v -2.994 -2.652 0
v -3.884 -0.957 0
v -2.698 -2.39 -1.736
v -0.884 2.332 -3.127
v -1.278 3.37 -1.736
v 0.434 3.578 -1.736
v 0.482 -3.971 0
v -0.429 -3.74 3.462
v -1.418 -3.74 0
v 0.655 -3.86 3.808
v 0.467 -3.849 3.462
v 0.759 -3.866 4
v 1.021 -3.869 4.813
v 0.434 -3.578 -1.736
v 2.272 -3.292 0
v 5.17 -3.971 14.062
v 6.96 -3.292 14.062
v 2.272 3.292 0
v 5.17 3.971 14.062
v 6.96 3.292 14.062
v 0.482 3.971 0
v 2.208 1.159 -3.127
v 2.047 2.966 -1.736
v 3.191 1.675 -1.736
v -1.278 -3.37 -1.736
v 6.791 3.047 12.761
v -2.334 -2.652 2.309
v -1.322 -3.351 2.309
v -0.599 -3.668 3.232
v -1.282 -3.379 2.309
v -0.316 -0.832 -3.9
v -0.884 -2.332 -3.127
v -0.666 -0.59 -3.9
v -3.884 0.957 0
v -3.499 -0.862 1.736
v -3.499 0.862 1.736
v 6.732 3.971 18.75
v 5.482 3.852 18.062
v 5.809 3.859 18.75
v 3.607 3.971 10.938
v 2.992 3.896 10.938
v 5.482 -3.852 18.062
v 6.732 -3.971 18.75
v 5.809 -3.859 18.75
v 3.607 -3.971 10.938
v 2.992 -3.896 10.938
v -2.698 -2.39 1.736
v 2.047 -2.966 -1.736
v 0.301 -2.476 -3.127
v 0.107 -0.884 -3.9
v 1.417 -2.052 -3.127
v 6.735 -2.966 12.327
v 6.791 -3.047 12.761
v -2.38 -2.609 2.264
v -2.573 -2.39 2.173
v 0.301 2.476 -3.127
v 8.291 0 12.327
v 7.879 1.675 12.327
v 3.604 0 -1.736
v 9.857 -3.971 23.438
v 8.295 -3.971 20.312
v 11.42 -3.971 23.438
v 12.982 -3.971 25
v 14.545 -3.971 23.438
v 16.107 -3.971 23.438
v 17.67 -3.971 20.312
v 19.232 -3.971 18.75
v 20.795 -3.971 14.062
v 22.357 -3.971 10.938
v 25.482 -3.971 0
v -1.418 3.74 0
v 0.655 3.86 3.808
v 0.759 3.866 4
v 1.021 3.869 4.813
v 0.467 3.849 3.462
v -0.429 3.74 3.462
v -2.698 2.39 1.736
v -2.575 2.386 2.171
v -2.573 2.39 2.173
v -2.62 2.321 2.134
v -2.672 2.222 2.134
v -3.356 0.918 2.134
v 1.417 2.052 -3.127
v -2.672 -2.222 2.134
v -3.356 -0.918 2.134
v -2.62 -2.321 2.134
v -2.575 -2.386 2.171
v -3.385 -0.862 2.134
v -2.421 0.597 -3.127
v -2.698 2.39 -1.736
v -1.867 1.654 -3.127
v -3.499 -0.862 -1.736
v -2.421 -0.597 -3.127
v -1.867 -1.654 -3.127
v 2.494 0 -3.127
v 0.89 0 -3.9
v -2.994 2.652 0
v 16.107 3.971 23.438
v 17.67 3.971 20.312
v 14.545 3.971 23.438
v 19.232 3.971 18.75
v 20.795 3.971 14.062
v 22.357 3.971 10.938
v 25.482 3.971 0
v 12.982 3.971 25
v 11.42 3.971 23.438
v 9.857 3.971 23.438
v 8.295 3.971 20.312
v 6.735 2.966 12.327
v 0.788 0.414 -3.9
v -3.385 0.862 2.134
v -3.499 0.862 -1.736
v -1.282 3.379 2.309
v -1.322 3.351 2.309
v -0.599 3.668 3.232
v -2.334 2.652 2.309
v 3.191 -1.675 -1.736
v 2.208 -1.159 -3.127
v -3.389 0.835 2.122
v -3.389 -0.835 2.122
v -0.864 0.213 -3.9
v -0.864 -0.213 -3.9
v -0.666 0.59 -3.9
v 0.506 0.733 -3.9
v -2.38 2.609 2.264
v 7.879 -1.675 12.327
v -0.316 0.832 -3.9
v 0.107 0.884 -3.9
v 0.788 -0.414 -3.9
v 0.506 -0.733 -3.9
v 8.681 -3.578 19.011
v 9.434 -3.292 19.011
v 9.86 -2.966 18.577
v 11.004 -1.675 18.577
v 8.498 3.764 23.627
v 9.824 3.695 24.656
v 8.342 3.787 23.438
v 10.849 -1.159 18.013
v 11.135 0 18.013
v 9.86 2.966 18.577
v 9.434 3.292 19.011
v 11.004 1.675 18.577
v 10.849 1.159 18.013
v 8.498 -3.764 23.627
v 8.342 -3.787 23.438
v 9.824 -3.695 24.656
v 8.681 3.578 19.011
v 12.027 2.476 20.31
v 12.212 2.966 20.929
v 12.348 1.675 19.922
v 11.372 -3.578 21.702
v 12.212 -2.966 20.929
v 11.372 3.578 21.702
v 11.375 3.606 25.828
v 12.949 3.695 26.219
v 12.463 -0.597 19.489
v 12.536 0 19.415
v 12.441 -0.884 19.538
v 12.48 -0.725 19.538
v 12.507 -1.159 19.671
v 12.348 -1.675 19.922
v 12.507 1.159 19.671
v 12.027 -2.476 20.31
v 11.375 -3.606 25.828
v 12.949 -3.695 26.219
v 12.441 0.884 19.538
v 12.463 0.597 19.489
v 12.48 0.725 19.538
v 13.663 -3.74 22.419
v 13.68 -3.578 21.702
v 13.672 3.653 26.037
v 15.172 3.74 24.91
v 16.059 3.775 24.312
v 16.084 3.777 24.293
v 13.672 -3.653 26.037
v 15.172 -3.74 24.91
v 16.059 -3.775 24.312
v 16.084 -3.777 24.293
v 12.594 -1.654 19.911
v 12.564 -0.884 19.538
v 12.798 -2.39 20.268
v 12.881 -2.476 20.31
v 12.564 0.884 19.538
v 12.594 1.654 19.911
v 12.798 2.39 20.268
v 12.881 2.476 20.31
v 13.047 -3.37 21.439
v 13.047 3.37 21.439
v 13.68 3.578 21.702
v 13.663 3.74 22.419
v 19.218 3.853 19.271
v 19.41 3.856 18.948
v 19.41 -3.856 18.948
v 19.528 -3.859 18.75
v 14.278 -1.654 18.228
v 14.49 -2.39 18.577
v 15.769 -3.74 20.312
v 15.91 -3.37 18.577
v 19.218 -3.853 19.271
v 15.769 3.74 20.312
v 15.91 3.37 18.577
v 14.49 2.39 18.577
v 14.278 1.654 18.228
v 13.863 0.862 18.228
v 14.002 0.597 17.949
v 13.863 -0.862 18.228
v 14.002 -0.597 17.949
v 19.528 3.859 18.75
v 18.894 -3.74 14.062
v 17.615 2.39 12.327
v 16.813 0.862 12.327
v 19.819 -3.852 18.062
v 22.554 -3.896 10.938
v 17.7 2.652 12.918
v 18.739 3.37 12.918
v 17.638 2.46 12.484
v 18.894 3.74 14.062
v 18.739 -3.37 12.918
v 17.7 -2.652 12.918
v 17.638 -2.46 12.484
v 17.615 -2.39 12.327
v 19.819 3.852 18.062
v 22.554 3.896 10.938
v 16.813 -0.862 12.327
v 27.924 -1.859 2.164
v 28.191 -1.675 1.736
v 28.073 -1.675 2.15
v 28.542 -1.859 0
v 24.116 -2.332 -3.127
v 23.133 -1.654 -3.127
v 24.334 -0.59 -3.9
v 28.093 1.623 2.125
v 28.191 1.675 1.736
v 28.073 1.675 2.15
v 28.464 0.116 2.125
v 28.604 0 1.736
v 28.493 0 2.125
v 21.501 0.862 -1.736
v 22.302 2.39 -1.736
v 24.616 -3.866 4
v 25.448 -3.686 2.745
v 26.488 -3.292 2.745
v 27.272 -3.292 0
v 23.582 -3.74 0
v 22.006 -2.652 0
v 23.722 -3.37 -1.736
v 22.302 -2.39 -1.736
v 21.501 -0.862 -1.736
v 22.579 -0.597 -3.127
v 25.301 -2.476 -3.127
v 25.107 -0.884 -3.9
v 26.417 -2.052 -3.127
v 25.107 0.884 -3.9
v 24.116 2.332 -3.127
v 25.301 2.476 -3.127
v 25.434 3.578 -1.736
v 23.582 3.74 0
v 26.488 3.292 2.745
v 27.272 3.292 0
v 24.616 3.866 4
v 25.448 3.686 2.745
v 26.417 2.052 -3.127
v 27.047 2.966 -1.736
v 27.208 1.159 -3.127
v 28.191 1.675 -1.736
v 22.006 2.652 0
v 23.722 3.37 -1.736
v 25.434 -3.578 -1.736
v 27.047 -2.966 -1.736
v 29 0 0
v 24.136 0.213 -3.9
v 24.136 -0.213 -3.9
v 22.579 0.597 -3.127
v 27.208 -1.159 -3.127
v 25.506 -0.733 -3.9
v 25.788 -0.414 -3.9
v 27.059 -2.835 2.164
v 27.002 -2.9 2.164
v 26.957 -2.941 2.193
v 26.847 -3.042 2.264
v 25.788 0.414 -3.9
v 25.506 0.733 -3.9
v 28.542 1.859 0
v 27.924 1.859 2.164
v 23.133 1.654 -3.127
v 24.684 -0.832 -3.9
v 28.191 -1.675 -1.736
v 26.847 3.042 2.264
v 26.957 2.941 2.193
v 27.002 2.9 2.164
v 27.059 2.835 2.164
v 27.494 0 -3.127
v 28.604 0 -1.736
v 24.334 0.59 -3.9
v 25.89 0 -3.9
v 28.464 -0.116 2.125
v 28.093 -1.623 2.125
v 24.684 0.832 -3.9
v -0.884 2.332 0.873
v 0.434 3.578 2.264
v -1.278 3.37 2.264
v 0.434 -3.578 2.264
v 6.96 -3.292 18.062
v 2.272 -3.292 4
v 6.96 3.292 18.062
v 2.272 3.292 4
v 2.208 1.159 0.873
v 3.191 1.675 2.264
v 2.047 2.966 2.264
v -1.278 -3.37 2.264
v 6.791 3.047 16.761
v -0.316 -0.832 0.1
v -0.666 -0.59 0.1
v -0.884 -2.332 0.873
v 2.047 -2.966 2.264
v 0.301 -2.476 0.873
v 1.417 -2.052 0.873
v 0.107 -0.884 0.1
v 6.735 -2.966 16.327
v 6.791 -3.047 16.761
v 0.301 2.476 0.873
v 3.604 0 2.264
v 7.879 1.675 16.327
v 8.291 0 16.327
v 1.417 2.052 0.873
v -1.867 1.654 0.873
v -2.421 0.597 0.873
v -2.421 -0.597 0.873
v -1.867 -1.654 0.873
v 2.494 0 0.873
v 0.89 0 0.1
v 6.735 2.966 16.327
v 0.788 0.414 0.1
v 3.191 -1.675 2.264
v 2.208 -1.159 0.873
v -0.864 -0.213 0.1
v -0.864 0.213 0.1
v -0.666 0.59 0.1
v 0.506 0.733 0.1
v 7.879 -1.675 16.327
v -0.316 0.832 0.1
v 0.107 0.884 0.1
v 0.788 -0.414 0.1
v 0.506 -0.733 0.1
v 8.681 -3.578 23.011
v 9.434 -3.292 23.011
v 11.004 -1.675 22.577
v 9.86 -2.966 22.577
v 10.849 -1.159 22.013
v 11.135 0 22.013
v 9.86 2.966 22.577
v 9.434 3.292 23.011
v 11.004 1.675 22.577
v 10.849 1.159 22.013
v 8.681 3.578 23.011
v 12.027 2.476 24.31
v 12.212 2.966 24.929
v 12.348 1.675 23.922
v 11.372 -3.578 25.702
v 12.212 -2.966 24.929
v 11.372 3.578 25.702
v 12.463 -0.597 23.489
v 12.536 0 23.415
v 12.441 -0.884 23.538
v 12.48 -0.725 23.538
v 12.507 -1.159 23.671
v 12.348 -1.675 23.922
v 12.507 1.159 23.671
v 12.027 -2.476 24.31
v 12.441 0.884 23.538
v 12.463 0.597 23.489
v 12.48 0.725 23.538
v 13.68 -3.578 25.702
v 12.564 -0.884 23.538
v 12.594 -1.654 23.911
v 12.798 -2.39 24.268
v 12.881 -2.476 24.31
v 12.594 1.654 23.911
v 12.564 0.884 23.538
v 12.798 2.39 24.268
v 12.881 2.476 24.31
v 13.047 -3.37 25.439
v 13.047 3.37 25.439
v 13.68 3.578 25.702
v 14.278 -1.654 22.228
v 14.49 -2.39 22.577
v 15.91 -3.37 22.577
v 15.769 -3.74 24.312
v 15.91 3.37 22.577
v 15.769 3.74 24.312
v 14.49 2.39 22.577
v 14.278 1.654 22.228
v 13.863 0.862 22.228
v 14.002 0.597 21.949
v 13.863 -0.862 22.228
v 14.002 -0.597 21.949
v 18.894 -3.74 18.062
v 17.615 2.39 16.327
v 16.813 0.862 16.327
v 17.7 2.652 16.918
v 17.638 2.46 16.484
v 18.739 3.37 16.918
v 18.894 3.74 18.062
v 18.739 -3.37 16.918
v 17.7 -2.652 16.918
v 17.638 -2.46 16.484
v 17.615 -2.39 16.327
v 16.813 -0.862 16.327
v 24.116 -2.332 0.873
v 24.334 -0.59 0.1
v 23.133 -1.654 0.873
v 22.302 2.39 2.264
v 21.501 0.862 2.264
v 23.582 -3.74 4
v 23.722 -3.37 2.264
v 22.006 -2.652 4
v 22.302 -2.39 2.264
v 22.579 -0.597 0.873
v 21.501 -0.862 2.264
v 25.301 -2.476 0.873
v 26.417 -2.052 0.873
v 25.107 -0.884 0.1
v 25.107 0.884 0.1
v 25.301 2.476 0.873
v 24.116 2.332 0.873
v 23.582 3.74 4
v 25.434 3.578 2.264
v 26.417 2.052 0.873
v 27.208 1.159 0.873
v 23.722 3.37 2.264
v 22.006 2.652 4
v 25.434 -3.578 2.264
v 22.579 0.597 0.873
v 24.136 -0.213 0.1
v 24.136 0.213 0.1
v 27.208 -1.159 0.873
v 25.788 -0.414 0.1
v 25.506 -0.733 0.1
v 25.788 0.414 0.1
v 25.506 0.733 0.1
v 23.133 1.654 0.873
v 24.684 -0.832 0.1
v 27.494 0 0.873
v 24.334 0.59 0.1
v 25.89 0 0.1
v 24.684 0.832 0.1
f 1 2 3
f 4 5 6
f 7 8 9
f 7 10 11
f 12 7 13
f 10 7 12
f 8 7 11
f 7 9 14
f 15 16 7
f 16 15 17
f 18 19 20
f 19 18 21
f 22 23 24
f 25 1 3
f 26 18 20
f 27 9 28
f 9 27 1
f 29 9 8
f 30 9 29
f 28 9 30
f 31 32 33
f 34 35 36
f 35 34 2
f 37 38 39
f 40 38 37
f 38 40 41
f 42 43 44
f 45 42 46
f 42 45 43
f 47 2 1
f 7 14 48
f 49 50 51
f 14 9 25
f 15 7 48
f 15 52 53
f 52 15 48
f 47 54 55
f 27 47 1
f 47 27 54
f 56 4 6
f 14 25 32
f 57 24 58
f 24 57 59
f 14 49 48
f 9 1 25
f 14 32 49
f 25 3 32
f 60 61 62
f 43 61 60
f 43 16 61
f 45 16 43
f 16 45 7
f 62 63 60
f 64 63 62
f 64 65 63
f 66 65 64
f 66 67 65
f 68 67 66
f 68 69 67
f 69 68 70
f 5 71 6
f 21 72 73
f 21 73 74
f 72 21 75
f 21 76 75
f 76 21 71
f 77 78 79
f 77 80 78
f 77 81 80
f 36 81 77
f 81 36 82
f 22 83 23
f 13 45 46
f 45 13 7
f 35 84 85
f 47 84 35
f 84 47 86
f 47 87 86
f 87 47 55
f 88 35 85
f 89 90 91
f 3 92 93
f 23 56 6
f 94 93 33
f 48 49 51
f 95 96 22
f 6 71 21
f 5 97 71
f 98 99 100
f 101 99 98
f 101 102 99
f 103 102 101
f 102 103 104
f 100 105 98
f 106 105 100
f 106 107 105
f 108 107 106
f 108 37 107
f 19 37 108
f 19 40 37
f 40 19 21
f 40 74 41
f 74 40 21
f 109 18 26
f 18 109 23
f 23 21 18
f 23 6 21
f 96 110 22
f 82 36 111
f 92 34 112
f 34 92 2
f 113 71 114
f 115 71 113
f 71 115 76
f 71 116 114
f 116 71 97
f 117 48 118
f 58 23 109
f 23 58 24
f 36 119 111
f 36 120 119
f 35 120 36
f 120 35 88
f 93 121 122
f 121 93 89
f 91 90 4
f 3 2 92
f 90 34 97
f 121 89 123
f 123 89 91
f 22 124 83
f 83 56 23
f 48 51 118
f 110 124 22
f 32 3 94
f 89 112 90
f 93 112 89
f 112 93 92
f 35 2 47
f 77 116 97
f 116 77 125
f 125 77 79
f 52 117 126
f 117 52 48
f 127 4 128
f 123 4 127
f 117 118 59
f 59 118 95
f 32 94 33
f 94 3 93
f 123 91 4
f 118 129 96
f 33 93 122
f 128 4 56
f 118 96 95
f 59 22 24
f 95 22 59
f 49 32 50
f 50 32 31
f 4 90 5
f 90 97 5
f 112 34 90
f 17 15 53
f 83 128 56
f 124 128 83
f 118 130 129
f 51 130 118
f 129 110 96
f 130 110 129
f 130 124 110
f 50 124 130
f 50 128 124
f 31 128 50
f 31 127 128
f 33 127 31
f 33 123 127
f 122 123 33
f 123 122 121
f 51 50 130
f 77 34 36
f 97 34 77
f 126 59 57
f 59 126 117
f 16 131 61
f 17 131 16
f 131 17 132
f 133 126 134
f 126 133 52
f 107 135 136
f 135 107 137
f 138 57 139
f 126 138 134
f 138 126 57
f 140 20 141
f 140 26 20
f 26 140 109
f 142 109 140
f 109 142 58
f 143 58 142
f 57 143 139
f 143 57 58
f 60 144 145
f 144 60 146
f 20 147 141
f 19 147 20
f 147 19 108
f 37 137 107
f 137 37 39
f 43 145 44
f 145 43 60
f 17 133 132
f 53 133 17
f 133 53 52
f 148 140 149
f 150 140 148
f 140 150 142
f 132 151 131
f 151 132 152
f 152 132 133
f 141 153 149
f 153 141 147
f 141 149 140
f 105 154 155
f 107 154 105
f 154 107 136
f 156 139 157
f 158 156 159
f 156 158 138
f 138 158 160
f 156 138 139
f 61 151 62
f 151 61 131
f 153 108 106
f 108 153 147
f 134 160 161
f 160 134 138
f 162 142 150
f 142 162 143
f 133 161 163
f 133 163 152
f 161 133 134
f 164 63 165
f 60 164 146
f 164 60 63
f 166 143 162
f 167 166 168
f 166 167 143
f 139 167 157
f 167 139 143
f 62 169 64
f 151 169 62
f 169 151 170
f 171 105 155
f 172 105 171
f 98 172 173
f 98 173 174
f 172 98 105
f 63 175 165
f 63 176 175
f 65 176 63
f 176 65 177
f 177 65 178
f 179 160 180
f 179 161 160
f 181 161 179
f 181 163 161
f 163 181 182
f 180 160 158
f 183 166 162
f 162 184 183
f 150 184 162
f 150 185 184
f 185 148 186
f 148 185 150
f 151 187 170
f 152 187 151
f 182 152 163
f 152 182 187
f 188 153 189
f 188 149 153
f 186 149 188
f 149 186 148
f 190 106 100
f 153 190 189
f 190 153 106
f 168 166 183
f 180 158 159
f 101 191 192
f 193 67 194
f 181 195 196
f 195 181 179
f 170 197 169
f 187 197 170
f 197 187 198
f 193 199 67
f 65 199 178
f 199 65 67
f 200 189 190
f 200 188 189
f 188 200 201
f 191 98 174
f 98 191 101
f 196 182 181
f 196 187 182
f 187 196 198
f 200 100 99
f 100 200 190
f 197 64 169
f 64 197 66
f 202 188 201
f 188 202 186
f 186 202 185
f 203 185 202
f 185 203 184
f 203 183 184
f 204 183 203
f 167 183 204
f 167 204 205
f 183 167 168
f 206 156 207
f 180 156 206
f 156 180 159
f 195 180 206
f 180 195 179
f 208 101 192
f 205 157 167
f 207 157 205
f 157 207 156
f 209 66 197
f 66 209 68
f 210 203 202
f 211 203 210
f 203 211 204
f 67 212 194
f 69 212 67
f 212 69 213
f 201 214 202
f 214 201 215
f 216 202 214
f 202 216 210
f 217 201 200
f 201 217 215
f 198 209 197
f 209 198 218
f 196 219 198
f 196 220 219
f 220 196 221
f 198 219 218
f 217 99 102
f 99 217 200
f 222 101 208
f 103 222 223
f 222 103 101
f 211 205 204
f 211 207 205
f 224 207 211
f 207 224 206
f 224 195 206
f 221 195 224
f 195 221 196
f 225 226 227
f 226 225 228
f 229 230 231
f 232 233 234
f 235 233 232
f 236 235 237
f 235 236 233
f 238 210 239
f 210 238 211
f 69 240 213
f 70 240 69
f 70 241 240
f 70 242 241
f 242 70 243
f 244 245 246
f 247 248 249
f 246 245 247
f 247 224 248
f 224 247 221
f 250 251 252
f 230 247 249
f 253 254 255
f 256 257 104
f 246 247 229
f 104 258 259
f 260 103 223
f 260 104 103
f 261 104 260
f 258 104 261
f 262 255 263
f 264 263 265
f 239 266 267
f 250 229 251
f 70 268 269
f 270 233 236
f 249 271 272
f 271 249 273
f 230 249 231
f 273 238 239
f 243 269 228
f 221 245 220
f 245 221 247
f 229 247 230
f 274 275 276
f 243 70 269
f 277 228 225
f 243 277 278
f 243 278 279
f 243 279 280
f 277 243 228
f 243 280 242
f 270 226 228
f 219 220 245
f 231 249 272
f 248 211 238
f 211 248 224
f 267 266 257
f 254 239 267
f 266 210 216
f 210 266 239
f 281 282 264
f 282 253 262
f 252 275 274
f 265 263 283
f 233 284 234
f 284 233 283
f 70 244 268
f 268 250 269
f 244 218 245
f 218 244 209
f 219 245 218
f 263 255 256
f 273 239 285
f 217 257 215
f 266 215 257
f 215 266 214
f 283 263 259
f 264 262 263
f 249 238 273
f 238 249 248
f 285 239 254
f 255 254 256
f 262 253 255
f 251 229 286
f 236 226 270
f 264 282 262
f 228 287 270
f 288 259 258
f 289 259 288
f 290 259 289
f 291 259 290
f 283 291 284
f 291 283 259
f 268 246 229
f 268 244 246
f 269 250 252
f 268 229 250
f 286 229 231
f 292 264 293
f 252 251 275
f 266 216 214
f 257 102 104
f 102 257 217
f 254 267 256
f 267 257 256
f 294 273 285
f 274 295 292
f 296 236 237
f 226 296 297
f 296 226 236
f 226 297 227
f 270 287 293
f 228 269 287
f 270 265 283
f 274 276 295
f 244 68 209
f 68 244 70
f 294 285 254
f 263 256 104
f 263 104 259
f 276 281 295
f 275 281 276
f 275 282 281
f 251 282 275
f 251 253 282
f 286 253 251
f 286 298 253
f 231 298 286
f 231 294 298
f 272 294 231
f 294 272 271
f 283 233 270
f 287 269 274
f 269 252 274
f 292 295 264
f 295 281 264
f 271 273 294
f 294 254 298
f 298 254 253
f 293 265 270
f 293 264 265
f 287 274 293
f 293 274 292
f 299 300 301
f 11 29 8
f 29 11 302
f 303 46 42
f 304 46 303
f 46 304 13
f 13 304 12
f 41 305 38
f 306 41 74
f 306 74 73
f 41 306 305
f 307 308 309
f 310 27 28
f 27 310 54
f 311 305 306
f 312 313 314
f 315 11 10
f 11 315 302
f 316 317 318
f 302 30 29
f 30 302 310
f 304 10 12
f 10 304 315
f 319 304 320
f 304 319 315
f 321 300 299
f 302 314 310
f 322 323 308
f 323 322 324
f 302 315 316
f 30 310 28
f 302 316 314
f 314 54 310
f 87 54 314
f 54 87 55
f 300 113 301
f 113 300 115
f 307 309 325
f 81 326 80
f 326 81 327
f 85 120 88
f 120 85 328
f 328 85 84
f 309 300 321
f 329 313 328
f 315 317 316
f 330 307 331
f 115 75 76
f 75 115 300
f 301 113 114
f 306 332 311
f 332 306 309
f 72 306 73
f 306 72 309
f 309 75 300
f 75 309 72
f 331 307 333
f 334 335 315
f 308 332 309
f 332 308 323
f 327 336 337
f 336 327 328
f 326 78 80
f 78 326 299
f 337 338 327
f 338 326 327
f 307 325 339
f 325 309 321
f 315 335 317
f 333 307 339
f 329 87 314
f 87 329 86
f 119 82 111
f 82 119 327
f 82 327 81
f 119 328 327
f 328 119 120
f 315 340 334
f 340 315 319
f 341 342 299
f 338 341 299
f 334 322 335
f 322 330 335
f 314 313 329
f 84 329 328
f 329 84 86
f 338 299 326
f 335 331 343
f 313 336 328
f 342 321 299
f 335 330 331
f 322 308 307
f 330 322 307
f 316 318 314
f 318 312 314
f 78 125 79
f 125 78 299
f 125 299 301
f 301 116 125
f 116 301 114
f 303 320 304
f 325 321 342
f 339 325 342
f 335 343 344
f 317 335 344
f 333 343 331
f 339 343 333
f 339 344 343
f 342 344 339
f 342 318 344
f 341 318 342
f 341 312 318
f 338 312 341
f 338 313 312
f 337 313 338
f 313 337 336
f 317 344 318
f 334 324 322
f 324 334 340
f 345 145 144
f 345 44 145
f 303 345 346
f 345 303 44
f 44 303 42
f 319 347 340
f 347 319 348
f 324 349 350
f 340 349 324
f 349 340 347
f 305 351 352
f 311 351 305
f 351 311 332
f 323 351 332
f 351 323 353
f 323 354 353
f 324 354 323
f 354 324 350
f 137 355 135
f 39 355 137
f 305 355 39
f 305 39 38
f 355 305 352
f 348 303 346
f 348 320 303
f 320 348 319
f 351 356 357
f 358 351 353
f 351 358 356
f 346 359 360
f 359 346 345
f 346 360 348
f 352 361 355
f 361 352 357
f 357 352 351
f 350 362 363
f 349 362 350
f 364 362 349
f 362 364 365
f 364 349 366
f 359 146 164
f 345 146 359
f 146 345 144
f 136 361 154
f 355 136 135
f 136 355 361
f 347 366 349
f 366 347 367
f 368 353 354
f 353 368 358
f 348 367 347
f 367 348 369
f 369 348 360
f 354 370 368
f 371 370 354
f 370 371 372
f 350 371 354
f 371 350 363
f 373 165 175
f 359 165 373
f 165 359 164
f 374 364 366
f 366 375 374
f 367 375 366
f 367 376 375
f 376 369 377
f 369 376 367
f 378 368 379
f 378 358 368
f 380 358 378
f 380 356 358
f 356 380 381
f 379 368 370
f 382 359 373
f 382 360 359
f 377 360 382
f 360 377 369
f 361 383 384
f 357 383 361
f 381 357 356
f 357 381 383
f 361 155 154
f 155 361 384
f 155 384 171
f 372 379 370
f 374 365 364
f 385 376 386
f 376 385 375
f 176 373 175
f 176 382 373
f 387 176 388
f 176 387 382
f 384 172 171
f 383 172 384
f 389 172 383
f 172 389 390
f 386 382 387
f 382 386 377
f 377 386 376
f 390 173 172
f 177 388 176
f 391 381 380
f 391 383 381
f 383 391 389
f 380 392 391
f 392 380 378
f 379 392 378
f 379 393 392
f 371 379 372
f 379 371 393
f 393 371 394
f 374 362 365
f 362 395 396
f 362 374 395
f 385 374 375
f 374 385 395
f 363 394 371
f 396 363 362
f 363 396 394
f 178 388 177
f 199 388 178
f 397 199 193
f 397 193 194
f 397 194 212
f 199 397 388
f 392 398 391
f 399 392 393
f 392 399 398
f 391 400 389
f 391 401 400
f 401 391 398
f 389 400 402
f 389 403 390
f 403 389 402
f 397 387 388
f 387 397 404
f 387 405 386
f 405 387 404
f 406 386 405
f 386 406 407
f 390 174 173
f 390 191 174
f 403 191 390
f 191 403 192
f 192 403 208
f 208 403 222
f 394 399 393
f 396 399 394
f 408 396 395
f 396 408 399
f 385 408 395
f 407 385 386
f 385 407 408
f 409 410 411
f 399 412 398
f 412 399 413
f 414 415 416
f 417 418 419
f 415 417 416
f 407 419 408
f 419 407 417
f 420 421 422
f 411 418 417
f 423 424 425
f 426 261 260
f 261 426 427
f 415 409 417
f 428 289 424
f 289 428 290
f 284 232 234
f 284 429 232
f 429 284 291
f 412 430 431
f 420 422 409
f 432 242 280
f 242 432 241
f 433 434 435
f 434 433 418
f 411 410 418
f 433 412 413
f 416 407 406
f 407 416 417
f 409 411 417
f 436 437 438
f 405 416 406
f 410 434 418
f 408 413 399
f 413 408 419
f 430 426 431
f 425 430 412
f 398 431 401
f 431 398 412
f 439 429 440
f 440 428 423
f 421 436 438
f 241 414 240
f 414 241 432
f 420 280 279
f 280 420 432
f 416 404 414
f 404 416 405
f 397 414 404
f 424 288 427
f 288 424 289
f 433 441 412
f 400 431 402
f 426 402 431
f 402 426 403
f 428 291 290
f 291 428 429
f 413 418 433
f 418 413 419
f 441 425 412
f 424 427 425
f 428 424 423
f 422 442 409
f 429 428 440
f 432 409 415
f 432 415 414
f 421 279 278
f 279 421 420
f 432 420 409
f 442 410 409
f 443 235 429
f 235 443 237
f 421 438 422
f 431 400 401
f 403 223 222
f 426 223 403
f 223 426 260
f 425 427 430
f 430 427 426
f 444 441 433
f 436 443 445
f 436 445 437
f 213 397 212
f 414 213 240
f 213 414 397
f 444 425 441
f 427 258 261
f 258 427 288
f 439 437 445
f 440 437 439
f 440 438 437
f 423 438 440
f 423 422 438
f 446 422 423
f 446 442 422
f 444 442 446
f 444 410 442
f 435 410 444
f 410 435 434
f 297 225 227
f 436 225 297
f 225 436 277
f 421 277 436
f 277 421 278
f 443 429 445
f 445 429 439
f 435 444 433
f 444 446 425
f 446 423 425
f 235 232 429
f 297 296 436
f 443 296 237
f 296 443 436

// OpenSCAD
// Written by A. Sternberg on 4/20/2016
// Use as you wish. With our without attribution.
//
// number of sphere for the convex hull (affects resolution)
n=8; // use an even number

// right most x center of the sphere
rightx=25;

// topz - apex of the parobala on z
topz=25;

// radius of sphere
r=4;

parts=2;// has to be  2 or more - how many parts to connect with convex hull

function xi(i) =  rightx*i/n;
function yi(i) = 0;
function zi(i) = topz*(-i*i+n*i)/(n*n/4);

module convexTrail(){

// start from 0 for a closed shape; 1 for an open shape
for(i=[0:parts-1:n-2]){
    hull()
    {
        for(j=[i:1:i+parts])
            basic_shape(xi(j),yi(j),zi(j));       
    }    
}
}
module basic_shape(x=0,y=0,z=0){
    translate([x,y,z])
    sphere(r=r,center=true);
  
}


difference(){
    convexTrail();
    translate([0,0,r])
        convexTrail();
}
